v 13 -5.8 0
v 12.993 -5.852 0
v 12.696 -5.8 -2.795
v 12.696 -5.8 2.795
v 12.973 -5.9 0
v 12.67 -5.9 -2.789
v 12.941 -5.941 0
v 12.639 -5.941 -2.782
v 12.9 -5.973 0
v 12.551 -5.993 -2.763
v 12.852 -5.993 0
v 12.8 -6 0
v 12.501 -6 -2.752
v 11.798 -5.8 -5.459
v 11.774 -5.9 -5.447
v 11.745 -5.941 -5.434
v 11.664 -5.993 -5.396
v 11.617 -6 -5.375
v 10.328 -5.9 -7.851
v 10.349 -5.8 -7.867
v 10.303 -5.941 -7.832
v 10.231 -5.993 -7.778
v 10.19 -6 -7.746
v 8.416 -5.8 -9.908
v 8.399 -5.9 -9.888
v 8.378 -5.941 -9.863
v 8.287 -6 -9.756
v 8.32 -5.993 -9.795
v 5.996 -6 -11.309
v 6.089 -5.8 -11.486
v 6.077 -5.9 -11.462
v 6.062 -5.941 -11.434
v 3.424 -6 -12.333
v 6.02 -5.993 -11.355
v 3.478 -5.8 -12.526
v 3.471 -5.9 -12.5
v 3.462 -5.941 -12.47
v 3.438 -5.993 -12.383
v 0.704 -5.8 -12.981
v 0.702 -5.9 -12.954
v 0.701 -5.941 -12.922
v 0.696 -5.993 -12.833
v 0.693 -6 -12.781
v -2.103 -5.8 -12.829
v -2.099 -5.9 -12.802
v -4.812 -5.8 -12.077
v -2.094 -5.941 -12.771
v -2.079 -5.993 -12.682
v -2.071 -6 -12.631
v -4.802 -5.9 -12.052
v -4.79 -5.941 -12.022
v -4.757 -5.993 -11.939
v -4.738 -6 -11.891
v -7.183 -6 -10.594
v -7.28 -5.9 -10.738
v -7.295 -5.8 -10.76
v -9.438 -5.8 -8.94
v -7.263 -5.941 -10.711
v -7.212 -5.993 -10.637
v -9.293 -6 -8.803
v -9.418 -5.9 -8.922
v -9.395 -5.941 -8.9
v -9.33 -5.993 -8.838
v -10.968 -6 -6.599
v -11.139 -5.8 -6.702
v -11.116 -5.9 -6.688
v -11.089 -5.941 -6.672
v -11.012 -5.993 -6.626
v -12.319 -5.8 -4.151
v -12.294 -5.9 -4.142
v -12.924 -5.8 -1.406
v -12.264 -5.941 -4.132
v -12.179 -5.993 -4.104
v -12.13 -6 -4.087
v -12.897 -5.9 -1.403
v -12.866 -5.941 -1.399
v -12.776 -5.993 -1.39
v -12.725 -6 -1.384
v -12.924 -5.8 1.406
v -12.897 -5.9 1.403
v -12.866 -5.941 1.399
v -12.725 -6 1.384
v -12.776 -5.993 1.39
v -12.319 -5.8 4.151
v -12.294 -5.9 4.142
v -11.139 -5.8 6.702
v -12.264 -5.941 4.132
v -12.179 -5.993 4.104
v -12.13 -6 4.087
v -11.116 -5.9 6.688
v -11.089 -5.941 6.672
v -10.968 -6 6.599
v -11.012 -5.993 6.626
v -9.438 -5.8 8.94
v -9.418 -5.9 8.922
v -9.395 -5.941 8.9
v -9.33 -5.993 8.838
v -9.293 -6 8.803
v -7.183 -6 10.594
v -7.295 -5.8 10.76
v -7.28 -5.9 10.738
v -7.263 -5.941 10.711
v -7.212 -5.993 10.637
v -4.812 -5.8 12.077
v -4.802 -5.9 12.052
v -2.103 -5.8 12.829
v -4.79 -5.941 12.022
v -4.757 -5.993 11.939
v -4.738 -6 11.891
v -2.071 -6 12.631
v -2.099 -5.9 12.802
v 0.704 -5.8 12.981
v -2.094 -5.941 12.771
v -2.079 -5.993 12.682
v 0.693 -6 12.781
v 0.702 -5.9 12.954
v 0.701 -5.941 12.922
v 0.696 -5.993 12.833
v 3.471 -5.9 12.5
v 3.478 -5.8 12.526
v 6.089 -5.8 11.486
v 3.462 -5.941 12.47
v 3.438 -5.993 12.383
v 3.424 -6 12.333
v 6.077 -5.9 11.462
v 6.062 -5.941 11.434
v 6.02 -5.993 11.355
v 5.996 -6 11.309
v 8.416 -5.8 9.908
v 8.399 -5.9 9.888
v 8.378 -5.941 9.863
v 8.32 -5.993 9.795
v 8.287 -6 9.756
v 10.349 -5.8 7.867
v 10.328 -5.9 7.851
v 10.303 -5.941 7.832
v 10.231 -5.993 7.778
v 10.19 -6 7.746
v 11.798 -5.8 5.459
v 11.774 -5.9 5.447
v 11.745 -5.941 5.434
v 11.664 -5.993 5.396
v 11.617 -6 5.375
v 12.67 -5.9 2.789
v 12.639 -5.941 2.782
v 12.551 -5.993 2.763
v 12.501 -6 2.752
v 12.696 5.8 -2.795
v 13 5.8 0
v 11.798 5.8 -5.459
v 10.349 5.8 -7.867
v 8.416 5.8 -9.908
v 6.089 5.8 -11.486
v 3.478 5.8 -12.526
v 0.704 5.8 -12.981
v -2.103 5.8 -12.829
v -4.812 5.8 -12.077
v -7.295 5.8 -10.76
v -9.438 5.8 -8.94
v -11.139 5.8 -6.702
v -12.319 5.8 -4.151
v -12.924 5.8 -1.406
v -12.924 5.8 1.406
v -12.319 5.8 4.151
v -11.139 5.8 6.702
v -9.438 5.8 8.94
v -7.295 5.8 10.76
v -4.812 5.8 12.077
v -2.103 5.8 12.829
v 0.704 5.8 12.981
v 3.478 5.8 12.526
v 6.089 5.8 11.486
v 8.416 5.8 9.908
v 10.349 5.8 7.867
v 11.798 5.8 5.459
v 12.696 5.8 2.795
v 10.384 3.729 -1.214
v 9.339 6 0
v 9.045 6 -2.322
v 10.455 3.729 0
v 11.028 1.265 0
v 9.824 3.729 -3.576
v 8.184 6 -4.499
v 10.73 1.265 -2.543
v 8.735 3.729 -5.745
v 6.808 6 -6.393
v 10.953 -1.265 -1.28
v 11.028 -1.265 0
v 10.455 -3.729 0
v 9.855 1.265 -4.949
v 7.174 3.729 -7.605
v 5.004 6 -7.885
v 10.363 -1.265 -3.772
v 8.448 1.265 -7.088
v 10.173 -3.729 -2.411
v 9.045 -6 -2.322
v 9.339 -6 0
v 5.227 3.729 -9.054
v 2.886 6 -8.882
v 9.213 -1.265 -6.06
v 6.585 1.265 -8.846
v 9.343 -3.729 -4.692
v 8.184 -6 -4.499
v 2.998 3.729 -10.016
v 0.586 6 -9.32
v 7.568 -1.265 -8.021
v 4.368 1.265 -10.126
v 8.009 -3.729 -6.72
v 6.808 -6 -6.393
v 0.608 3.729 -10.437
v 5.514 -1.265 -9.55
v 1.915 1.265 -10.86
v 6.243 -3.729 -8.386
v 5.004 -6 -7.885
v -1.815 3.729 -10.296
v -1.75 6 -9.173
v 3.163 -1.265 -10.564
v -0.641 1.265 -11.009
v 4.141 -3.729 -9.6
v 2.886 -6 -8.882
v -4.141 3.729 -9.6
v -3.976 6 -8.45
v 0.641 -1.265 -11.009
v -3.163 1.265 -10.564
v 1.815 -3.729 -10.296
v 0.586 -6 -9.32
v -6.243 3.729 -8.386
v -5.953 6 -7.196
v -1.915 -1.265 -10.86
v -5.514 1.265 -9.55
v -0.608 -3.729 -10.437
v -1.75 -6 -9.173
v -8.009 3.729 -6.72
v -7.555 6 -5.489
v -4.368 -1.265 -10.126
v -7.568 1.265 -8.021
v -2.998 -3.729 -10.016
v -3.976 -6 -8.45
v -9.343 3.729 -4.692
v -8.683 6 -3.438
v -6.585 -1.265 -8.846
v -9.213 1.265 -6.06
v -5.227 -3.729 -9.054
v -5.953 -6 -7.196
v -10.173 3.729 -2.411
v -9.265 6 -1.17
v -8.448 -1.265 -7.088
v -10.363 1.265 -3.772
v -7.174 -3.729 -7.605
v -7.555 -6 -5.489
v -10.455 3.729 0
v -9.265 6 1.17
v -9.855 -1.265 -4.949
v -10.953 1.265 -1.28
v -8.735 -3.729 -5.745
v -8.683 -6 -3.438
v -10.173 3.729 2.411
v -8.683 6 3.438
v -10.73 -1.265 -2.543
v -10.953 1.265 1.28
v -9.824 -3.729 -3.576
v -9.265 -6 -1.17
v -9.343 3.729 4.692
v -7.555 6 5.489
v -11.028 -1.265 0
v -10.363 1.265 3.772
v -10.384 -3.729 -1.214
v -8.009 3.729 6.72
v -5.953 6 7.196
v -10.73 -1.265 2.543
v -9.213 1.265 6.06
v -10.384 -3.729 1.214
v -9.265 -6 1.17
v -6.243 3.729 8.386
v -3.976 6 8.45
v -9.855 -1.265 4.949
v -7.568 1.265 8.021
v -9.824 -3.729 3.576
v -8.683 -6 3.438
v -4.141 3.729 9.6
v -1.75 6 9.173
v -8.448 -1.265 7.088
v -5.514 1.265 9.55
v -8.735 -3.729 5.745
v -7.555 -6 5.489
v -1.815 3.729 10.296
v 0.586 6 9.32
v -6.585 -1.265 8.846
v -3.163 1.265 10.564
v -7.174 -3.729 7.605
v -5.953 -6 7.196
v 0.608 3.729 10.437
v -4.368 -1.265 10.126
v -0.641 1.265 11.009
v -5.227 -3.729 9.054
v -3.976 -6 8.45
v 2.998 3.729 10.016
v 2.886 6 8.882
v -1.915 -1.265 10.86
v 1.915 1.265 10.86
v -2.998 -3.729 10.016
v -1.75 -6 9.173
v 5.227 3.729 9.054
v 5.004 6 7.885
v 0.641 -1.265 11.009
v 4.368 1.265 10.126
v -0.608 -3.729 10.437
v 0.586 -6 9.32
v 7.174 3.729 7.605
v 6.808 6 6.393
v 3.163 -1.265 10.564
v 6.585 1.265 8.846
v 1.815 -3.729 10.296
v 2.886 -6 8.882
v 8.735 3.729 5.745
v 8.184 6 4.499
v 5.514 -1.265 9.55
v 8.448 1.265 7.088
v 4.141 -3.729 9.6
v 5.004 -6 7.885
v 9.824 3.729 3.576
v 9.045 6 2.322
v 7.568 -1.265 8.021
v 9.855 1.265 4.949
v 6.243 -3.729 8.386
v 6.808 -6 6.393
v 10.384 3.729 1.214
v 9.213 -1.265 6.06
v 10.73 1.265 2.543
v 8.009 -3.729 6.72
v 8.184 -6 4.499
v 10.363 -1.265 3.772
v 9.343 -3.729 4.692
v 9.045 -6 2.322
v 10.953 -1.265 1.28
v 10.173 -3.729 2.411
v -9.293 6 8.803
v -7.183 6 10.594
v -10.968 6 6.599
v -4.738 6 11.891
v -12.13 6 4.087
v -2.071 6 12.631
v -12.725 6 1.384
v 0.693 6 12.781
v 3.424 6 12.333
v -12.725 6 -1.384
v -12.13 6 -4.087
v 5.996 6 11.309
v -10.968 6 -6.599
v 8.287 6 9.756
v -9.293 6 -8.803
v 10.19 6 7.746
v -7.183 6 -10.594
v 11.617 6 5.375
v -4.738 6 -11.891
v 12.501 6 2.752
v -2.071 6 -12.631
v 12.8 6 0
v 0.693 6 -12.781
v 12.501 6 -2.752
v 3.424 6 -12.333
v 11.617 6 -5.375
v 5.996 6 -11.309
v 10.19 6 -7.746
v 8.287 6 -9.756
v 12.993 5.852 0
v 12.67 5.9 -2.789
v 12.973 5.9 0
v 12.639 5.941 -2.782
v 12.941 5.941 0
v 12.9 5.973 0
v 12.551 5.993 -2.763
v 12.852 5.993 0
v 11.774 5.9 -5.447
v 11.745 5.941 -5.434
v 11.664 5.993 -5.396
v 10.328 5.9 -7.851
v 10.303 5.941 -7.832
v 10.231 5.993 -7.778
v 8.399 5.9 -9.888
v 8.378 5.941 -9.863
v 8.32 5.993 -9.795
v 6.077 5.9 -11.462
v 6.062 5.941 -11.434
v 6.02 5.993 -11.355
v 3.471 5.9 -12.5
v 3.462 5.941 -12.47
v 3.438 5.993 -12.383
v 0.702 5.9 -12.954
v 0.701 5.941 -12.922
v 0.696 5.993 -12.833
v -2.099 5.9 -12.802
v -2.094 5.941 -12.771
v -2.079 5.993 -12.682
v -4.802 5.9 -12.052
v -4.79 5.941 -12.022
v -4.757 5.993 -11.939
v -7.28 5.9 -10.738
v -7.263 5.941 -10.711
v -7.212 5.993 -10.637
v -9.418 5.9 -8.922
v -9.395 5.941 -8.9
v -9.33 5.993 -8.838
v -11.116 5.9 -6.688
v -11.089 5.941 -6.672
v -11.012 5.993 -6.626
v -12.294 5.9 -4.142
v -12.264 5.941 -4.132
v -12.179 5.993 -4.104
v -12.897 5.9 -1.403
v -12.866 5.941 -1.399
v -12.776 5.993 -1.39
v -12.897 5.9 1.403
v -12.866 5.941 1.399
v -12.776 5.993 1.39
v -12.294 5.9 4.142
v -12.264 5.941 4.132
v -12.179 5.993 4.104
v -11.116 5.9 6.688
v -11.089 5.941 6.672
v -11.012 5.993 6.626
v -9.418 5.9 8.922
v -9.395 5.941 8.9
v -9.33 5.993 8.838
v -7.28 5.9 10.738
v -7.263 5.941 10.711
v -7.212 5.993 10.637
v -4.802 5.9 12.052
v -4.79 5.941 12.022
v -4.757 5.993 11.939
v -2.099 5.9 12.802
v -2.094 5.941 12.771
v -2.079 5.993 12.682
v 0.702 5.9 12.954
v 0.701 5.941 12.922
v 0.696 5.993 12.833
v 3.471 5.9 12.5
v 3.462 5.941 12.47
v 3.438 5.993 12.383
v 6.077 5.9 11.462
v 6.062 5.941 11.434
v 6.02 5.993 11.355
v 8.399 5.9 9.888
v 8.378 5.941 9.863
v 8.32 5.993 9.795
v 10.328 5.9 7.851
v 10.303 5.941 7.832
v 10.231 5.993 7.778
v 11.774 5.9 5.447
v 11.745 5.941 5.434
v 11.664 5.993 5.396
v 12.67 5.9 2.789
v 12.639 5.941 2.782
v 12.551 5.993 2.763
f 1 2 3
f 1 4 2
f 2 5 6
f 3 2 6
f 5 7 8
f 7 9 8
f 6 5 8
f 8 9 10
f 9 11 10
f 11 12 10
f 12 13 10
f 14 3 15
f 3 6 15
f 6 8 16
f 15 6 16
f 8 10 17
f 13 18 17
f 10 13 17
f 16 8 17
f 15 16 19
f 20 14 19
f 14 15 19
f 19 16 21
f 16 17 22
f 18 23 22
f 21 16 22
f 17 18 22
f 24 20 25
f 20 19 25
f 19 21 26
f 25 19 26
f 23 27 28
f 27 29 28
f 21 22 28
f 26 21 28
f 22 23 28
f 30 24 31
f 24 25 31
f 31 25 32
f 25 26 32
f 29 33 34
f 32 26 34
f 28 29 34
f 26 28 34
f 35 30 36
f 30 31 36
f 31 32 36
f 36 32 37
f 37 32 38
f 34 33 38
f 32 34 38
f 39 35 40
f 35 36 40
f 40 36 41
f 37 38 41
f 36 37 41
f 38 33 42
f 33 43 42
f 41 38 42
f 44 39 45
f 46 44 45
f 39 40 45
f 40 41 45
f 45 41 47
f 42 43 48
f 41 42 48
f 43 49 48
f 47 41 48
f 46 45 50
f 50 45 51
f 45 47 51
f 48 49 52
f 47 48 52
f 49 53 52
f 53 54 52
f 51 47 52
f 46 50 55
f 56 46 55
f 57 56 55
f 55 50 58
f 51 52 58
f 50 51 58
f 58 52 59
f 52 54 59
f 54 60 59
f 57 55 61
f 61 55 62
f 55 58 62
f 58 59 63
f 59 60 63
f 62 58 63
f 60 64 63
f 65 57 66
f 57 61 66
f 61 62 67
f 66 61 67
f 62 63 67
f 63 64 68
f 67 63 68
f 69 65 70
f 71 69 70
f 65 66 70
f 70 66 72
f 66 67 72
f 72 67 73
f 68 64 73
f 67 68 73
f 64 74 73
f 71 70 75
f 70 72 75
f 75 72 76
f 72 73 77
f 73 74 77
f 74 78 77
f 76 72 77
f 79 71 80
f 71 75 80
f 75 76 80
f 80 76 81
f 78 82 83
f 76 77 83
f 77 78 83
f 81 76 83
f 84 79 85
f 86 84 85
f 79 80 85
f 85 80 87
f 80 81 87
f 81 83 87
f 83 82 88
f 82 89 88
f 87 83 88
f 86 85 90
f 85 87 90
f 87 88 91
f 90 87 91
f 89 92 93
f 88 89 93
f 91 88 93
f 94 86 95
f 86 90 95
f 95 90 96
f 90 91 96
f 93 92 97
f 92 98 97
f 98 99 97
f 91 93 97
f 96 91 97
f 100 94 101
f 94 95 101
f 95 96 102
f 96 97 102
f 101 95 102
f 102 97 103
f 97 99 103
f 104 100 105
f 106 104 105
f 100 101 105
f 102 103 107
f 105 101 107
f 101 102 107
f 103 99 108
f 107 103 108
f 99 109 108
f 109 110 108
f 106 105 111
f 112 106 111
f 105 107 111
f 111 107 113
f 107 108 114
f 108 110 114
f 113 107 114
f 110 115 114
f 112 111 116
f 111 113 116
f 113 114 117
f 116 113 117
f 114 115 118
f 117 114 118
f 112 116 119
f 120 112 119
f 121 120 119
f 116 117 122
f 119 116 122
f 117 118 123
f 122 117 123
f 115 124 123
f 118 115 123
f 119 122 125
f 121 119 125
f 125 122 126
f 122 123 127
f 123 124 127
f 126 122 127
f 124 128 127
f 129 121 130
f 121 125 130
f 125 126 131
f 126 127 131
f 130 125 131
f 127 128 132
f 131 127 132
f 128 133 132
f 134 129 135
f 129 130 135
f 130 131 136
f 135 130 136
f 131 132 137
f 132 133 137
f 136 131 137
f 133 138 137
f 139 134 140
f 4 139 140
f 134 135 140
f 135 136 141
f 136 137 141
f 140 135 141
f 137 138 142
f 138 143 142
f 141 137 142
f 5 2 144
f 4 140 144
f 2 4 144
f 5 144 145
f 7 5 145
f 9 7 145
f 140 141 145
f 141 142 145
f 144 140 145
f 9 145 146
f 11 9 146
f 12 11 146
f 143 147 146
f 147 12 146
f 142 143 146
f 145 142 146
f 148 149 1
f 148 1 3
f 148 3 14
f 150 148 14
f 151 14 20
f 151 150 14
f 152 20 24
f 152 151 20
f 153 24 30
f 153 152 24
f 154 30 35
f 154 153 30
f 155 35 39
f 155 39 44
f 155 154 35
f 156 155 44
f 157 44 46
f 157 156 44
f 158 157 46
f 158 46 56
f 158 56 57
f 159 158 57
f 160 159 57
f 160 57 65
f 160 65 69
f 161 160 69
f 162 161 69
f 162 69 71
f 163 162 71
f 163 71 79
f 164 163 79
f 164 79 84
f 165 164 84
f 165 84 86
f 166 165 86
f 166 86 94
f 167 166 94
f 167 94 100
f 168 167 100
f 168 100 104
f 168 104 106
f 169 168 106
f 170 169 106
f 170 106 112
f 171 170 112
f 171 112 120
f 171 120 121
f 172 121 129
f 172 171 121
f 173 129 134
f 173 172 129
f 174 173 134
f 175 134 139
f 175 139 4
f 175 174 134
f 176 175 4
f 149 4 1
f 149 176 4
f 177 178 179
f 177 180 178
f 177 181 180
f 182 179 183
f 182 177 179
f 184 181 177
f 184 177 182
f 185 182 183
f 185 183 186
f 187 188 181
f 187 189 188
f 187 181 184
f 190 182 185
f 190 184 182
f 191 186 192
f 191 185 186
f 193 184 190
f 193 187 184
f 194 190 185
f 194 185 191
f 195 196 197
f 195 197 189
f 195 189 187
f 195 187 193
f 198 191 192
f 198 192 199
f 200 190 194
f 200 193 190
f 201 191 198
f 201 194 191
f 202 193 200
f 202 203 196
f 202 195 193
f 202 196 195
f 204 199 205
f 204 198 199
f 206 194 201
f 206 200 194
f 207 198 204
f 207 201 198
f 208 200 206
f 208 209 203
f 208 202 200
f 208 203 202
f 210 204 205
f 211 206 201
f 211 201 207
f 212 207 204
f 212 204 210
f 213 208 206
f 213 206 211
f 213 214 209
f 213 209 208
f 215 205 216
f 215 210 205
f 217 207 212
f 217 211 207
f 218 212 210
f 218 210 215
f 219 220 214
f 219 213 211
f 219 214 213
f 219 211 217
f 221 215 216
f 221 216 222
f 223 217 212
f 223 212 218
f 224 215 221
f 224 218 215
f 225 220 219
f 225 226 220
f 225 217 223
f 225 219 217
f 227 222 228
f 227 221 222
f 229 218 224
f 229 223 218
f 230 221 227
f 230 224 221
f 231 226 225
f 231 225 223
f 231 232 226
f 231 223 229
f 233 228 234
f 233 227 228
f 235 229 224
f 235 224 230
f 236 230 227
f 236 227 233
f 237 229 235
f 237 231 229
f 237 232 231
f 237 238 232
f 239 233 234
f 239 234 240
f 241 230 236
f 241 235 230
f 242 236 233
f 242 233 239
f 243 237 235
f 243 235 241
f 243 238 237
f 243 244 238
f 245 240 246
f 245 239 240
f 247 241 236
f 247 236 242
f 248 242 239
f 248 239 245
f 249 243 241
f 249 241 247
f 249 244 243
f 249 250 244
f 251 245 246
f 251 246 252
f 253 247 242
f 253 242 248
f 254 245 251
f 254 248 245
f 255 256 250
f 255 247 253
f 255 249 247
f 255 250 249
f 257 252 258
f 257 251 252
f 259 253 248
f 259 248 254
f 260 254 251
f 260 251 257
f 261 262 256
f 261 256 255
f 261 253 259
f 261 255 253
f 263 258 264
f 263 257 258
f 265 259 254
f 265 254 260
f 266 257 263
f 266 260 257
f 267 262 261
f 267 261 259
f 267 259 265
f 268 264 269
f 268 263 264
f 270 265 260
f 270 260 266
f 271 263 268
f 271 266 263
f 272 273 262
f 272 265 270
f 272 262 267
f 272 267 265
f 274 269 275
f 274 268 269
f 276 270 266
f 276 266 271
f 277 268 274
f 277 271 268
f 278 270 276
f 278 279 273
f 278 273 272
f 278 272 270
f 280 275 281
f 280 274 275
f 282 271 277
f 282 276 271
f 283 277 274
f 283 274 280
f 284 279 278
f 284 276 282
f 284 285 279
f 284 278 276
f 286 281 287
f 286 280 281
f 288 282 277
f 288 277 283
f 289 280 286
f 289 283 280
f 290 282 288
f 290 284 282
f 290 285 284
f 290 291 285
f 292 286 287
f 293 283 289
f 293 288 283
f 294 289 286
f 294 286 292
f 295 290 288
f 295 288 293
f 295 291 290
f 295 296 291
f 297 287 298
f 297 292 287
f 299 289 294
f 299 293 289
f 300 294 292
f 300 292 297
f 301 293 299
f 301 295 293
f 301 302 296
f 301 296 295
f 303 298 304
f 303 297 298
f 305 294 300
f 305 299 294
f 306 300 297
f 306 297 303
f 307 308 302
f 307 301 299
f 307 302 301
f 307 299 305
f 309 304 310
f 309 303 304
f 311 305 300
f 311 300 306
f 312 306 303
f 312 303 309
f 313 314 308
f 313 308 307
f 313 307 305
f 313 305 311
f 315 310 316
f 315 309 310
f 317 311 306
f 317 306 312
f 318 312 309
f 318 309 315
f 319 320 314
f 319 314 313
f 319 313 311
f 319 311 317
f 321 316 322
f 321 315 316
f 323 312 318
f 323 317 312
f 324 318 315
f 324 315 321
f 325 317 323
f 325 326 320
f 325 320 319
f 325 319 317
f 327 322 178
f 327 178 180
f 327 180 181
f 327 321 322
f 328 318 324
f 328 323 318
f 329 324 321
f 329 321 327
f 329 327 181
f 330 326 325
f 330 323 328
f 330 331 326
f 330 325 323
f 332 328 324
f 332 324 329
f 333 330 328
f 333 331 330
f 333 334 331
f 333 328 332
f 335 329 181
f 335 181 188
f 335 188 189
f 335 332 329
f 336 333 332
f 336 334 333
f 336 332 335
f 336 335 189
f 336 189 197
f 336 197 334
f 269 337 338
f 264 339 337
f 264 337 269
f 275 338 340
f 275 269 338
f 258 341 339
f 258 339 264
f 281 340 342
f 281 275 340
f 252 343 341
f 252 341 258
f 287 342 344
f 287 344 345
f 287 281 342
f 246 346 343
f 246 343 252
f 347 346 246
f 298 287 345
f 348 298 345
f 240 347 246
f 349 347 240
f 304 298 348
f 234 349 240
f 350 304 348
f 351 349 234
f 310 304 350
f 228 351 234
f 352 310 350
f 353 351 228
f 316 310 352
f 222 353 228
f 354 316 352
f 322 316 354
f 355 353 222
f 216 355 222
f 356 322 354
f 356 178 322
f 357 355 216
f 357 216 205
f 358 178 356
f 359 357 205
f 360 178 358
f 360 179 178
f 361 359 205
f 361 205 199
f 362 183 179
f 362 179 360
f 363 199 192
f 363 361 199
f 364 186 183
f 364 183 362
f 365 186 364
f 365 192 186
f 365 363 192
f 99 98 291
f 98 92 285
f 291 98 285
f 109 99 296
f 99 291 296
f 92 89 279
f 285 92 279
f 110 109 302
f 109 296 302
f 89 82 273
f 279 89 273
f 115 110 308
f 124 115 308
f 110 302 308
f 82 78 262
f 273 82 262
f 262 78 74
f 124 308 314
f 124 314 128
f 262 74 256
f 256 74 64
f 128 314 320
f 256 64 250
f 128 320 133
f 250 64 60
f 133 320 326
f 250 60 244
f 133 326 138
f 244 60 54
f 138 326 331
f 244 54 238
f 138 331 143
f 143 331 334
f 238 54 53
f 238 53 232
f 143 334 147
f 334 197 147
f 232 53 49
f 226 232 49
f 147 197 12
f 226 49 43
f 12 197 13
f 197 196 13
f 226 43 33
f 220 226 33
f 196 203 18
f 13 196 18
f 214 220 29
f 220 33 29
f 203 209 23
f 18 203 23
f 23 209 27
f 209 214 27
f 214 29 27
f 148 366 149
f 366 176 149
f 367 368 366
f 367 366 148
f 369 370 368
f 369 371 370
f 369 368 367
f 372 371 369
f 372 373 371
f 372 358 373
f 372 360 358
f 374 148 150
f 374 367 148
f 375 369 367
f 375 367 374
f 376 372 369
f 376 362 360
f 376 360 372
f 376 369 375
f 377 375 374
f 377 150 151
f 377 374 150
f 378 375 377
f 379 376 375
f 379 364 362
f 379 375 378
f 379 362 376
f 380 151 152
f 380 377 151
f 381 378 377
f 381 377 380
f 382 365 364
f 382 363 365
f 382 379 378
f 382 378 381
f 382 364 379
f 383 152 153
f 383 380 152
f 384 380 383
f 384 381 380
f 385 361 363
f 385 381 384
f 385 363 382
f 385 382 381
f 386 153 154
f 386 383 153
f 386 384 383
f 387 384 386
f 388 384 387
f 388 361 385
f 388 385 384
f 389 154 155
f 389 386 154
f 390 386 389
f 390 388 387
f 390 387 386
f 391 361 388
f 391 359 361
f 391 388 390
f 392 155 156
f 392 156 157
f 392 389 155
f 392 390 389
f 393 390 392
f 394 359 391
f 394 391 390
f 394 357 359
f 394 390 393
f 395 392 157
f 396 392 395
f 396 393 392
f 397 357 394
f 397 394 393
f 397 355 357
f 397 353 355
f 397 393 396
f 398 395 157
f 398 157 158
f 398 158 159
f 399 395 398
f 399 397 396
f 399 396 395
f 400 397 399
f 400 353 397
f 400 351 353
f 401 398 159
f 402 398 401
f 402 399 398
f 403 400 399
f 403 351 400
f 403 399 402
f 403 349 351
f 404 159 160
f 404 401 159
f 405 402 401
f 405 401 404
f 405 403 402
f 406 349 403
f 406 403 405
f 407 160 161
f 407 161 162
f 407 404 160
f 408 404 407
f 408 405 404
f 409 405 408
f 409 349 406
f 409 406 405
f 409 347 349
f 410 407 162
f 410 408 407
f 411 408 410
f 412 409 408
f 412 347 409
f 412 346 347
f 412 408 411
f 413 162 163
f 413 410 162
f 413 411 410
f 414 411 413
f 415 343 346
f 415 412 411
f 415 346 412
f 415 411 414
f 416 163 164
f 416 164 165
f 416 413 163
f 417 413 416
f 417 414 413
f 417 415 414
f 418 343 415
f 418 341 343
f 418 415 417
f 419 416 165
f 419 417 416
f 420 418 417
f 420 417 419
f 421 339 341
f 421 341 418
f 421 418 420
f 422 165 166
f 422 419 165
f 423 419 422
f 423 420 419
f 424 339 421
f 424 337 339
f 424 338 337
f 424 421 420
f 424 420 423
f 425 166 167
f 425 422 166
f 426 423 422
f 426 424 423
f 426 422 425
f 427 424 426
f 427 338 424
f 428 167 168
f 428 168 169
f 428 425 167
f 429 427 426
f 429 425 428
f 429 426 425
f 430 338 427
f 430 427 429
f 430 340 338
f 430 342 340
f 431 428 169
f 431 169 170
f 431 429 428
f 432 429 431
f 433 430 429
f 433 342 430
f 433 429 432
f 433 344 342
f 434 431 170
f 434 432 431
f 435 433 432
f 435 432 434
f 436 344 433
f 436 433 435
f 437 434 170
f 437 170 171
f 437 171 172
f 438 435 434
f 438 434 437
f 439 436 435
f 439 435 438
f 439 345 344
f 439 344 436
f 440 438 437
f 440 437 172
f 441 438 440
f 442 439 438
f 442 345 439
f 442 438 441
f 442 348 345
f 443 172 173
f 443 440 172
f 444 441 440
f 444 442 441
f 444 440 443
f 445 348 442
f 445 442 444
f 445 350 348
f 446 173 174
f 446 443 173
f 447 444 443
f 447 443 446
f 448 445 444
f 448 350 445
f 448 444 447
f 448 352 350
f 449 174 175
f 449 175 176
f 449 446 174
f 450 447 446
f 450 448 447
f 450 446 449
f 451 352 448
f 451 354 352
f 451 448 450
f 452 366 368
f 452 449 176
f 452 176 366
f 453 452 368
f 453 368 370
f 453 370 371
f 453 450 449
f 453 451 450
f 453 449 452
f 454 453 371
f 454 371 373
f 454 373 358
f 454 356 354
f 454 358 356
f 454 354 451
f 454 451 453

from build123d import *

# Parameters (mm, degrees)
SZKIC1_R                    = 13
DODANIE_WYCI_GNI_CIE1_DEPTH = 6
ZAOKR_GLENIE1_R             = 0.2


with BuildPart() as part:
    # Szkic1 → Dodanie-wyciągnięcie1 (new body, symmetric)
    with BuildSketch(Plane(origin=(0, 0, 0), x_dir=(1, 0, 0), z_dir=(0, 1, 0))):
        Circle(SZKIC1_R)
    extrude(amount=DODANIE_WYCI_GNI_CIE1_DEPTH, both=True)

    # Szkic3 → Wycięcie-obrót1 (revolve, cut)
    with BuildSketch(Plane.XY):
        with BuildLine():
            Line((0, -11.1), (0, 11.1))
            ThreePointArc((0, 11.1), (11.1, 0), (0, -11.1))
        make_face()
    revolve(axis=Axis((0, -11.1, 0), (0, 1, 0)), mode=Mode.SUBTRACT)

    # Zaokrąglenie1
    zaokr_glenie1_edges = [part.edges().sort_by_distance(p)[0] for p in [
        (-13, -6, 0),
        (-13, 6, 0),
    ]]
    fillet(zaokr_glenie1_edges, radius=ZAOKR_GLENIE1_R)


solid = part.part
